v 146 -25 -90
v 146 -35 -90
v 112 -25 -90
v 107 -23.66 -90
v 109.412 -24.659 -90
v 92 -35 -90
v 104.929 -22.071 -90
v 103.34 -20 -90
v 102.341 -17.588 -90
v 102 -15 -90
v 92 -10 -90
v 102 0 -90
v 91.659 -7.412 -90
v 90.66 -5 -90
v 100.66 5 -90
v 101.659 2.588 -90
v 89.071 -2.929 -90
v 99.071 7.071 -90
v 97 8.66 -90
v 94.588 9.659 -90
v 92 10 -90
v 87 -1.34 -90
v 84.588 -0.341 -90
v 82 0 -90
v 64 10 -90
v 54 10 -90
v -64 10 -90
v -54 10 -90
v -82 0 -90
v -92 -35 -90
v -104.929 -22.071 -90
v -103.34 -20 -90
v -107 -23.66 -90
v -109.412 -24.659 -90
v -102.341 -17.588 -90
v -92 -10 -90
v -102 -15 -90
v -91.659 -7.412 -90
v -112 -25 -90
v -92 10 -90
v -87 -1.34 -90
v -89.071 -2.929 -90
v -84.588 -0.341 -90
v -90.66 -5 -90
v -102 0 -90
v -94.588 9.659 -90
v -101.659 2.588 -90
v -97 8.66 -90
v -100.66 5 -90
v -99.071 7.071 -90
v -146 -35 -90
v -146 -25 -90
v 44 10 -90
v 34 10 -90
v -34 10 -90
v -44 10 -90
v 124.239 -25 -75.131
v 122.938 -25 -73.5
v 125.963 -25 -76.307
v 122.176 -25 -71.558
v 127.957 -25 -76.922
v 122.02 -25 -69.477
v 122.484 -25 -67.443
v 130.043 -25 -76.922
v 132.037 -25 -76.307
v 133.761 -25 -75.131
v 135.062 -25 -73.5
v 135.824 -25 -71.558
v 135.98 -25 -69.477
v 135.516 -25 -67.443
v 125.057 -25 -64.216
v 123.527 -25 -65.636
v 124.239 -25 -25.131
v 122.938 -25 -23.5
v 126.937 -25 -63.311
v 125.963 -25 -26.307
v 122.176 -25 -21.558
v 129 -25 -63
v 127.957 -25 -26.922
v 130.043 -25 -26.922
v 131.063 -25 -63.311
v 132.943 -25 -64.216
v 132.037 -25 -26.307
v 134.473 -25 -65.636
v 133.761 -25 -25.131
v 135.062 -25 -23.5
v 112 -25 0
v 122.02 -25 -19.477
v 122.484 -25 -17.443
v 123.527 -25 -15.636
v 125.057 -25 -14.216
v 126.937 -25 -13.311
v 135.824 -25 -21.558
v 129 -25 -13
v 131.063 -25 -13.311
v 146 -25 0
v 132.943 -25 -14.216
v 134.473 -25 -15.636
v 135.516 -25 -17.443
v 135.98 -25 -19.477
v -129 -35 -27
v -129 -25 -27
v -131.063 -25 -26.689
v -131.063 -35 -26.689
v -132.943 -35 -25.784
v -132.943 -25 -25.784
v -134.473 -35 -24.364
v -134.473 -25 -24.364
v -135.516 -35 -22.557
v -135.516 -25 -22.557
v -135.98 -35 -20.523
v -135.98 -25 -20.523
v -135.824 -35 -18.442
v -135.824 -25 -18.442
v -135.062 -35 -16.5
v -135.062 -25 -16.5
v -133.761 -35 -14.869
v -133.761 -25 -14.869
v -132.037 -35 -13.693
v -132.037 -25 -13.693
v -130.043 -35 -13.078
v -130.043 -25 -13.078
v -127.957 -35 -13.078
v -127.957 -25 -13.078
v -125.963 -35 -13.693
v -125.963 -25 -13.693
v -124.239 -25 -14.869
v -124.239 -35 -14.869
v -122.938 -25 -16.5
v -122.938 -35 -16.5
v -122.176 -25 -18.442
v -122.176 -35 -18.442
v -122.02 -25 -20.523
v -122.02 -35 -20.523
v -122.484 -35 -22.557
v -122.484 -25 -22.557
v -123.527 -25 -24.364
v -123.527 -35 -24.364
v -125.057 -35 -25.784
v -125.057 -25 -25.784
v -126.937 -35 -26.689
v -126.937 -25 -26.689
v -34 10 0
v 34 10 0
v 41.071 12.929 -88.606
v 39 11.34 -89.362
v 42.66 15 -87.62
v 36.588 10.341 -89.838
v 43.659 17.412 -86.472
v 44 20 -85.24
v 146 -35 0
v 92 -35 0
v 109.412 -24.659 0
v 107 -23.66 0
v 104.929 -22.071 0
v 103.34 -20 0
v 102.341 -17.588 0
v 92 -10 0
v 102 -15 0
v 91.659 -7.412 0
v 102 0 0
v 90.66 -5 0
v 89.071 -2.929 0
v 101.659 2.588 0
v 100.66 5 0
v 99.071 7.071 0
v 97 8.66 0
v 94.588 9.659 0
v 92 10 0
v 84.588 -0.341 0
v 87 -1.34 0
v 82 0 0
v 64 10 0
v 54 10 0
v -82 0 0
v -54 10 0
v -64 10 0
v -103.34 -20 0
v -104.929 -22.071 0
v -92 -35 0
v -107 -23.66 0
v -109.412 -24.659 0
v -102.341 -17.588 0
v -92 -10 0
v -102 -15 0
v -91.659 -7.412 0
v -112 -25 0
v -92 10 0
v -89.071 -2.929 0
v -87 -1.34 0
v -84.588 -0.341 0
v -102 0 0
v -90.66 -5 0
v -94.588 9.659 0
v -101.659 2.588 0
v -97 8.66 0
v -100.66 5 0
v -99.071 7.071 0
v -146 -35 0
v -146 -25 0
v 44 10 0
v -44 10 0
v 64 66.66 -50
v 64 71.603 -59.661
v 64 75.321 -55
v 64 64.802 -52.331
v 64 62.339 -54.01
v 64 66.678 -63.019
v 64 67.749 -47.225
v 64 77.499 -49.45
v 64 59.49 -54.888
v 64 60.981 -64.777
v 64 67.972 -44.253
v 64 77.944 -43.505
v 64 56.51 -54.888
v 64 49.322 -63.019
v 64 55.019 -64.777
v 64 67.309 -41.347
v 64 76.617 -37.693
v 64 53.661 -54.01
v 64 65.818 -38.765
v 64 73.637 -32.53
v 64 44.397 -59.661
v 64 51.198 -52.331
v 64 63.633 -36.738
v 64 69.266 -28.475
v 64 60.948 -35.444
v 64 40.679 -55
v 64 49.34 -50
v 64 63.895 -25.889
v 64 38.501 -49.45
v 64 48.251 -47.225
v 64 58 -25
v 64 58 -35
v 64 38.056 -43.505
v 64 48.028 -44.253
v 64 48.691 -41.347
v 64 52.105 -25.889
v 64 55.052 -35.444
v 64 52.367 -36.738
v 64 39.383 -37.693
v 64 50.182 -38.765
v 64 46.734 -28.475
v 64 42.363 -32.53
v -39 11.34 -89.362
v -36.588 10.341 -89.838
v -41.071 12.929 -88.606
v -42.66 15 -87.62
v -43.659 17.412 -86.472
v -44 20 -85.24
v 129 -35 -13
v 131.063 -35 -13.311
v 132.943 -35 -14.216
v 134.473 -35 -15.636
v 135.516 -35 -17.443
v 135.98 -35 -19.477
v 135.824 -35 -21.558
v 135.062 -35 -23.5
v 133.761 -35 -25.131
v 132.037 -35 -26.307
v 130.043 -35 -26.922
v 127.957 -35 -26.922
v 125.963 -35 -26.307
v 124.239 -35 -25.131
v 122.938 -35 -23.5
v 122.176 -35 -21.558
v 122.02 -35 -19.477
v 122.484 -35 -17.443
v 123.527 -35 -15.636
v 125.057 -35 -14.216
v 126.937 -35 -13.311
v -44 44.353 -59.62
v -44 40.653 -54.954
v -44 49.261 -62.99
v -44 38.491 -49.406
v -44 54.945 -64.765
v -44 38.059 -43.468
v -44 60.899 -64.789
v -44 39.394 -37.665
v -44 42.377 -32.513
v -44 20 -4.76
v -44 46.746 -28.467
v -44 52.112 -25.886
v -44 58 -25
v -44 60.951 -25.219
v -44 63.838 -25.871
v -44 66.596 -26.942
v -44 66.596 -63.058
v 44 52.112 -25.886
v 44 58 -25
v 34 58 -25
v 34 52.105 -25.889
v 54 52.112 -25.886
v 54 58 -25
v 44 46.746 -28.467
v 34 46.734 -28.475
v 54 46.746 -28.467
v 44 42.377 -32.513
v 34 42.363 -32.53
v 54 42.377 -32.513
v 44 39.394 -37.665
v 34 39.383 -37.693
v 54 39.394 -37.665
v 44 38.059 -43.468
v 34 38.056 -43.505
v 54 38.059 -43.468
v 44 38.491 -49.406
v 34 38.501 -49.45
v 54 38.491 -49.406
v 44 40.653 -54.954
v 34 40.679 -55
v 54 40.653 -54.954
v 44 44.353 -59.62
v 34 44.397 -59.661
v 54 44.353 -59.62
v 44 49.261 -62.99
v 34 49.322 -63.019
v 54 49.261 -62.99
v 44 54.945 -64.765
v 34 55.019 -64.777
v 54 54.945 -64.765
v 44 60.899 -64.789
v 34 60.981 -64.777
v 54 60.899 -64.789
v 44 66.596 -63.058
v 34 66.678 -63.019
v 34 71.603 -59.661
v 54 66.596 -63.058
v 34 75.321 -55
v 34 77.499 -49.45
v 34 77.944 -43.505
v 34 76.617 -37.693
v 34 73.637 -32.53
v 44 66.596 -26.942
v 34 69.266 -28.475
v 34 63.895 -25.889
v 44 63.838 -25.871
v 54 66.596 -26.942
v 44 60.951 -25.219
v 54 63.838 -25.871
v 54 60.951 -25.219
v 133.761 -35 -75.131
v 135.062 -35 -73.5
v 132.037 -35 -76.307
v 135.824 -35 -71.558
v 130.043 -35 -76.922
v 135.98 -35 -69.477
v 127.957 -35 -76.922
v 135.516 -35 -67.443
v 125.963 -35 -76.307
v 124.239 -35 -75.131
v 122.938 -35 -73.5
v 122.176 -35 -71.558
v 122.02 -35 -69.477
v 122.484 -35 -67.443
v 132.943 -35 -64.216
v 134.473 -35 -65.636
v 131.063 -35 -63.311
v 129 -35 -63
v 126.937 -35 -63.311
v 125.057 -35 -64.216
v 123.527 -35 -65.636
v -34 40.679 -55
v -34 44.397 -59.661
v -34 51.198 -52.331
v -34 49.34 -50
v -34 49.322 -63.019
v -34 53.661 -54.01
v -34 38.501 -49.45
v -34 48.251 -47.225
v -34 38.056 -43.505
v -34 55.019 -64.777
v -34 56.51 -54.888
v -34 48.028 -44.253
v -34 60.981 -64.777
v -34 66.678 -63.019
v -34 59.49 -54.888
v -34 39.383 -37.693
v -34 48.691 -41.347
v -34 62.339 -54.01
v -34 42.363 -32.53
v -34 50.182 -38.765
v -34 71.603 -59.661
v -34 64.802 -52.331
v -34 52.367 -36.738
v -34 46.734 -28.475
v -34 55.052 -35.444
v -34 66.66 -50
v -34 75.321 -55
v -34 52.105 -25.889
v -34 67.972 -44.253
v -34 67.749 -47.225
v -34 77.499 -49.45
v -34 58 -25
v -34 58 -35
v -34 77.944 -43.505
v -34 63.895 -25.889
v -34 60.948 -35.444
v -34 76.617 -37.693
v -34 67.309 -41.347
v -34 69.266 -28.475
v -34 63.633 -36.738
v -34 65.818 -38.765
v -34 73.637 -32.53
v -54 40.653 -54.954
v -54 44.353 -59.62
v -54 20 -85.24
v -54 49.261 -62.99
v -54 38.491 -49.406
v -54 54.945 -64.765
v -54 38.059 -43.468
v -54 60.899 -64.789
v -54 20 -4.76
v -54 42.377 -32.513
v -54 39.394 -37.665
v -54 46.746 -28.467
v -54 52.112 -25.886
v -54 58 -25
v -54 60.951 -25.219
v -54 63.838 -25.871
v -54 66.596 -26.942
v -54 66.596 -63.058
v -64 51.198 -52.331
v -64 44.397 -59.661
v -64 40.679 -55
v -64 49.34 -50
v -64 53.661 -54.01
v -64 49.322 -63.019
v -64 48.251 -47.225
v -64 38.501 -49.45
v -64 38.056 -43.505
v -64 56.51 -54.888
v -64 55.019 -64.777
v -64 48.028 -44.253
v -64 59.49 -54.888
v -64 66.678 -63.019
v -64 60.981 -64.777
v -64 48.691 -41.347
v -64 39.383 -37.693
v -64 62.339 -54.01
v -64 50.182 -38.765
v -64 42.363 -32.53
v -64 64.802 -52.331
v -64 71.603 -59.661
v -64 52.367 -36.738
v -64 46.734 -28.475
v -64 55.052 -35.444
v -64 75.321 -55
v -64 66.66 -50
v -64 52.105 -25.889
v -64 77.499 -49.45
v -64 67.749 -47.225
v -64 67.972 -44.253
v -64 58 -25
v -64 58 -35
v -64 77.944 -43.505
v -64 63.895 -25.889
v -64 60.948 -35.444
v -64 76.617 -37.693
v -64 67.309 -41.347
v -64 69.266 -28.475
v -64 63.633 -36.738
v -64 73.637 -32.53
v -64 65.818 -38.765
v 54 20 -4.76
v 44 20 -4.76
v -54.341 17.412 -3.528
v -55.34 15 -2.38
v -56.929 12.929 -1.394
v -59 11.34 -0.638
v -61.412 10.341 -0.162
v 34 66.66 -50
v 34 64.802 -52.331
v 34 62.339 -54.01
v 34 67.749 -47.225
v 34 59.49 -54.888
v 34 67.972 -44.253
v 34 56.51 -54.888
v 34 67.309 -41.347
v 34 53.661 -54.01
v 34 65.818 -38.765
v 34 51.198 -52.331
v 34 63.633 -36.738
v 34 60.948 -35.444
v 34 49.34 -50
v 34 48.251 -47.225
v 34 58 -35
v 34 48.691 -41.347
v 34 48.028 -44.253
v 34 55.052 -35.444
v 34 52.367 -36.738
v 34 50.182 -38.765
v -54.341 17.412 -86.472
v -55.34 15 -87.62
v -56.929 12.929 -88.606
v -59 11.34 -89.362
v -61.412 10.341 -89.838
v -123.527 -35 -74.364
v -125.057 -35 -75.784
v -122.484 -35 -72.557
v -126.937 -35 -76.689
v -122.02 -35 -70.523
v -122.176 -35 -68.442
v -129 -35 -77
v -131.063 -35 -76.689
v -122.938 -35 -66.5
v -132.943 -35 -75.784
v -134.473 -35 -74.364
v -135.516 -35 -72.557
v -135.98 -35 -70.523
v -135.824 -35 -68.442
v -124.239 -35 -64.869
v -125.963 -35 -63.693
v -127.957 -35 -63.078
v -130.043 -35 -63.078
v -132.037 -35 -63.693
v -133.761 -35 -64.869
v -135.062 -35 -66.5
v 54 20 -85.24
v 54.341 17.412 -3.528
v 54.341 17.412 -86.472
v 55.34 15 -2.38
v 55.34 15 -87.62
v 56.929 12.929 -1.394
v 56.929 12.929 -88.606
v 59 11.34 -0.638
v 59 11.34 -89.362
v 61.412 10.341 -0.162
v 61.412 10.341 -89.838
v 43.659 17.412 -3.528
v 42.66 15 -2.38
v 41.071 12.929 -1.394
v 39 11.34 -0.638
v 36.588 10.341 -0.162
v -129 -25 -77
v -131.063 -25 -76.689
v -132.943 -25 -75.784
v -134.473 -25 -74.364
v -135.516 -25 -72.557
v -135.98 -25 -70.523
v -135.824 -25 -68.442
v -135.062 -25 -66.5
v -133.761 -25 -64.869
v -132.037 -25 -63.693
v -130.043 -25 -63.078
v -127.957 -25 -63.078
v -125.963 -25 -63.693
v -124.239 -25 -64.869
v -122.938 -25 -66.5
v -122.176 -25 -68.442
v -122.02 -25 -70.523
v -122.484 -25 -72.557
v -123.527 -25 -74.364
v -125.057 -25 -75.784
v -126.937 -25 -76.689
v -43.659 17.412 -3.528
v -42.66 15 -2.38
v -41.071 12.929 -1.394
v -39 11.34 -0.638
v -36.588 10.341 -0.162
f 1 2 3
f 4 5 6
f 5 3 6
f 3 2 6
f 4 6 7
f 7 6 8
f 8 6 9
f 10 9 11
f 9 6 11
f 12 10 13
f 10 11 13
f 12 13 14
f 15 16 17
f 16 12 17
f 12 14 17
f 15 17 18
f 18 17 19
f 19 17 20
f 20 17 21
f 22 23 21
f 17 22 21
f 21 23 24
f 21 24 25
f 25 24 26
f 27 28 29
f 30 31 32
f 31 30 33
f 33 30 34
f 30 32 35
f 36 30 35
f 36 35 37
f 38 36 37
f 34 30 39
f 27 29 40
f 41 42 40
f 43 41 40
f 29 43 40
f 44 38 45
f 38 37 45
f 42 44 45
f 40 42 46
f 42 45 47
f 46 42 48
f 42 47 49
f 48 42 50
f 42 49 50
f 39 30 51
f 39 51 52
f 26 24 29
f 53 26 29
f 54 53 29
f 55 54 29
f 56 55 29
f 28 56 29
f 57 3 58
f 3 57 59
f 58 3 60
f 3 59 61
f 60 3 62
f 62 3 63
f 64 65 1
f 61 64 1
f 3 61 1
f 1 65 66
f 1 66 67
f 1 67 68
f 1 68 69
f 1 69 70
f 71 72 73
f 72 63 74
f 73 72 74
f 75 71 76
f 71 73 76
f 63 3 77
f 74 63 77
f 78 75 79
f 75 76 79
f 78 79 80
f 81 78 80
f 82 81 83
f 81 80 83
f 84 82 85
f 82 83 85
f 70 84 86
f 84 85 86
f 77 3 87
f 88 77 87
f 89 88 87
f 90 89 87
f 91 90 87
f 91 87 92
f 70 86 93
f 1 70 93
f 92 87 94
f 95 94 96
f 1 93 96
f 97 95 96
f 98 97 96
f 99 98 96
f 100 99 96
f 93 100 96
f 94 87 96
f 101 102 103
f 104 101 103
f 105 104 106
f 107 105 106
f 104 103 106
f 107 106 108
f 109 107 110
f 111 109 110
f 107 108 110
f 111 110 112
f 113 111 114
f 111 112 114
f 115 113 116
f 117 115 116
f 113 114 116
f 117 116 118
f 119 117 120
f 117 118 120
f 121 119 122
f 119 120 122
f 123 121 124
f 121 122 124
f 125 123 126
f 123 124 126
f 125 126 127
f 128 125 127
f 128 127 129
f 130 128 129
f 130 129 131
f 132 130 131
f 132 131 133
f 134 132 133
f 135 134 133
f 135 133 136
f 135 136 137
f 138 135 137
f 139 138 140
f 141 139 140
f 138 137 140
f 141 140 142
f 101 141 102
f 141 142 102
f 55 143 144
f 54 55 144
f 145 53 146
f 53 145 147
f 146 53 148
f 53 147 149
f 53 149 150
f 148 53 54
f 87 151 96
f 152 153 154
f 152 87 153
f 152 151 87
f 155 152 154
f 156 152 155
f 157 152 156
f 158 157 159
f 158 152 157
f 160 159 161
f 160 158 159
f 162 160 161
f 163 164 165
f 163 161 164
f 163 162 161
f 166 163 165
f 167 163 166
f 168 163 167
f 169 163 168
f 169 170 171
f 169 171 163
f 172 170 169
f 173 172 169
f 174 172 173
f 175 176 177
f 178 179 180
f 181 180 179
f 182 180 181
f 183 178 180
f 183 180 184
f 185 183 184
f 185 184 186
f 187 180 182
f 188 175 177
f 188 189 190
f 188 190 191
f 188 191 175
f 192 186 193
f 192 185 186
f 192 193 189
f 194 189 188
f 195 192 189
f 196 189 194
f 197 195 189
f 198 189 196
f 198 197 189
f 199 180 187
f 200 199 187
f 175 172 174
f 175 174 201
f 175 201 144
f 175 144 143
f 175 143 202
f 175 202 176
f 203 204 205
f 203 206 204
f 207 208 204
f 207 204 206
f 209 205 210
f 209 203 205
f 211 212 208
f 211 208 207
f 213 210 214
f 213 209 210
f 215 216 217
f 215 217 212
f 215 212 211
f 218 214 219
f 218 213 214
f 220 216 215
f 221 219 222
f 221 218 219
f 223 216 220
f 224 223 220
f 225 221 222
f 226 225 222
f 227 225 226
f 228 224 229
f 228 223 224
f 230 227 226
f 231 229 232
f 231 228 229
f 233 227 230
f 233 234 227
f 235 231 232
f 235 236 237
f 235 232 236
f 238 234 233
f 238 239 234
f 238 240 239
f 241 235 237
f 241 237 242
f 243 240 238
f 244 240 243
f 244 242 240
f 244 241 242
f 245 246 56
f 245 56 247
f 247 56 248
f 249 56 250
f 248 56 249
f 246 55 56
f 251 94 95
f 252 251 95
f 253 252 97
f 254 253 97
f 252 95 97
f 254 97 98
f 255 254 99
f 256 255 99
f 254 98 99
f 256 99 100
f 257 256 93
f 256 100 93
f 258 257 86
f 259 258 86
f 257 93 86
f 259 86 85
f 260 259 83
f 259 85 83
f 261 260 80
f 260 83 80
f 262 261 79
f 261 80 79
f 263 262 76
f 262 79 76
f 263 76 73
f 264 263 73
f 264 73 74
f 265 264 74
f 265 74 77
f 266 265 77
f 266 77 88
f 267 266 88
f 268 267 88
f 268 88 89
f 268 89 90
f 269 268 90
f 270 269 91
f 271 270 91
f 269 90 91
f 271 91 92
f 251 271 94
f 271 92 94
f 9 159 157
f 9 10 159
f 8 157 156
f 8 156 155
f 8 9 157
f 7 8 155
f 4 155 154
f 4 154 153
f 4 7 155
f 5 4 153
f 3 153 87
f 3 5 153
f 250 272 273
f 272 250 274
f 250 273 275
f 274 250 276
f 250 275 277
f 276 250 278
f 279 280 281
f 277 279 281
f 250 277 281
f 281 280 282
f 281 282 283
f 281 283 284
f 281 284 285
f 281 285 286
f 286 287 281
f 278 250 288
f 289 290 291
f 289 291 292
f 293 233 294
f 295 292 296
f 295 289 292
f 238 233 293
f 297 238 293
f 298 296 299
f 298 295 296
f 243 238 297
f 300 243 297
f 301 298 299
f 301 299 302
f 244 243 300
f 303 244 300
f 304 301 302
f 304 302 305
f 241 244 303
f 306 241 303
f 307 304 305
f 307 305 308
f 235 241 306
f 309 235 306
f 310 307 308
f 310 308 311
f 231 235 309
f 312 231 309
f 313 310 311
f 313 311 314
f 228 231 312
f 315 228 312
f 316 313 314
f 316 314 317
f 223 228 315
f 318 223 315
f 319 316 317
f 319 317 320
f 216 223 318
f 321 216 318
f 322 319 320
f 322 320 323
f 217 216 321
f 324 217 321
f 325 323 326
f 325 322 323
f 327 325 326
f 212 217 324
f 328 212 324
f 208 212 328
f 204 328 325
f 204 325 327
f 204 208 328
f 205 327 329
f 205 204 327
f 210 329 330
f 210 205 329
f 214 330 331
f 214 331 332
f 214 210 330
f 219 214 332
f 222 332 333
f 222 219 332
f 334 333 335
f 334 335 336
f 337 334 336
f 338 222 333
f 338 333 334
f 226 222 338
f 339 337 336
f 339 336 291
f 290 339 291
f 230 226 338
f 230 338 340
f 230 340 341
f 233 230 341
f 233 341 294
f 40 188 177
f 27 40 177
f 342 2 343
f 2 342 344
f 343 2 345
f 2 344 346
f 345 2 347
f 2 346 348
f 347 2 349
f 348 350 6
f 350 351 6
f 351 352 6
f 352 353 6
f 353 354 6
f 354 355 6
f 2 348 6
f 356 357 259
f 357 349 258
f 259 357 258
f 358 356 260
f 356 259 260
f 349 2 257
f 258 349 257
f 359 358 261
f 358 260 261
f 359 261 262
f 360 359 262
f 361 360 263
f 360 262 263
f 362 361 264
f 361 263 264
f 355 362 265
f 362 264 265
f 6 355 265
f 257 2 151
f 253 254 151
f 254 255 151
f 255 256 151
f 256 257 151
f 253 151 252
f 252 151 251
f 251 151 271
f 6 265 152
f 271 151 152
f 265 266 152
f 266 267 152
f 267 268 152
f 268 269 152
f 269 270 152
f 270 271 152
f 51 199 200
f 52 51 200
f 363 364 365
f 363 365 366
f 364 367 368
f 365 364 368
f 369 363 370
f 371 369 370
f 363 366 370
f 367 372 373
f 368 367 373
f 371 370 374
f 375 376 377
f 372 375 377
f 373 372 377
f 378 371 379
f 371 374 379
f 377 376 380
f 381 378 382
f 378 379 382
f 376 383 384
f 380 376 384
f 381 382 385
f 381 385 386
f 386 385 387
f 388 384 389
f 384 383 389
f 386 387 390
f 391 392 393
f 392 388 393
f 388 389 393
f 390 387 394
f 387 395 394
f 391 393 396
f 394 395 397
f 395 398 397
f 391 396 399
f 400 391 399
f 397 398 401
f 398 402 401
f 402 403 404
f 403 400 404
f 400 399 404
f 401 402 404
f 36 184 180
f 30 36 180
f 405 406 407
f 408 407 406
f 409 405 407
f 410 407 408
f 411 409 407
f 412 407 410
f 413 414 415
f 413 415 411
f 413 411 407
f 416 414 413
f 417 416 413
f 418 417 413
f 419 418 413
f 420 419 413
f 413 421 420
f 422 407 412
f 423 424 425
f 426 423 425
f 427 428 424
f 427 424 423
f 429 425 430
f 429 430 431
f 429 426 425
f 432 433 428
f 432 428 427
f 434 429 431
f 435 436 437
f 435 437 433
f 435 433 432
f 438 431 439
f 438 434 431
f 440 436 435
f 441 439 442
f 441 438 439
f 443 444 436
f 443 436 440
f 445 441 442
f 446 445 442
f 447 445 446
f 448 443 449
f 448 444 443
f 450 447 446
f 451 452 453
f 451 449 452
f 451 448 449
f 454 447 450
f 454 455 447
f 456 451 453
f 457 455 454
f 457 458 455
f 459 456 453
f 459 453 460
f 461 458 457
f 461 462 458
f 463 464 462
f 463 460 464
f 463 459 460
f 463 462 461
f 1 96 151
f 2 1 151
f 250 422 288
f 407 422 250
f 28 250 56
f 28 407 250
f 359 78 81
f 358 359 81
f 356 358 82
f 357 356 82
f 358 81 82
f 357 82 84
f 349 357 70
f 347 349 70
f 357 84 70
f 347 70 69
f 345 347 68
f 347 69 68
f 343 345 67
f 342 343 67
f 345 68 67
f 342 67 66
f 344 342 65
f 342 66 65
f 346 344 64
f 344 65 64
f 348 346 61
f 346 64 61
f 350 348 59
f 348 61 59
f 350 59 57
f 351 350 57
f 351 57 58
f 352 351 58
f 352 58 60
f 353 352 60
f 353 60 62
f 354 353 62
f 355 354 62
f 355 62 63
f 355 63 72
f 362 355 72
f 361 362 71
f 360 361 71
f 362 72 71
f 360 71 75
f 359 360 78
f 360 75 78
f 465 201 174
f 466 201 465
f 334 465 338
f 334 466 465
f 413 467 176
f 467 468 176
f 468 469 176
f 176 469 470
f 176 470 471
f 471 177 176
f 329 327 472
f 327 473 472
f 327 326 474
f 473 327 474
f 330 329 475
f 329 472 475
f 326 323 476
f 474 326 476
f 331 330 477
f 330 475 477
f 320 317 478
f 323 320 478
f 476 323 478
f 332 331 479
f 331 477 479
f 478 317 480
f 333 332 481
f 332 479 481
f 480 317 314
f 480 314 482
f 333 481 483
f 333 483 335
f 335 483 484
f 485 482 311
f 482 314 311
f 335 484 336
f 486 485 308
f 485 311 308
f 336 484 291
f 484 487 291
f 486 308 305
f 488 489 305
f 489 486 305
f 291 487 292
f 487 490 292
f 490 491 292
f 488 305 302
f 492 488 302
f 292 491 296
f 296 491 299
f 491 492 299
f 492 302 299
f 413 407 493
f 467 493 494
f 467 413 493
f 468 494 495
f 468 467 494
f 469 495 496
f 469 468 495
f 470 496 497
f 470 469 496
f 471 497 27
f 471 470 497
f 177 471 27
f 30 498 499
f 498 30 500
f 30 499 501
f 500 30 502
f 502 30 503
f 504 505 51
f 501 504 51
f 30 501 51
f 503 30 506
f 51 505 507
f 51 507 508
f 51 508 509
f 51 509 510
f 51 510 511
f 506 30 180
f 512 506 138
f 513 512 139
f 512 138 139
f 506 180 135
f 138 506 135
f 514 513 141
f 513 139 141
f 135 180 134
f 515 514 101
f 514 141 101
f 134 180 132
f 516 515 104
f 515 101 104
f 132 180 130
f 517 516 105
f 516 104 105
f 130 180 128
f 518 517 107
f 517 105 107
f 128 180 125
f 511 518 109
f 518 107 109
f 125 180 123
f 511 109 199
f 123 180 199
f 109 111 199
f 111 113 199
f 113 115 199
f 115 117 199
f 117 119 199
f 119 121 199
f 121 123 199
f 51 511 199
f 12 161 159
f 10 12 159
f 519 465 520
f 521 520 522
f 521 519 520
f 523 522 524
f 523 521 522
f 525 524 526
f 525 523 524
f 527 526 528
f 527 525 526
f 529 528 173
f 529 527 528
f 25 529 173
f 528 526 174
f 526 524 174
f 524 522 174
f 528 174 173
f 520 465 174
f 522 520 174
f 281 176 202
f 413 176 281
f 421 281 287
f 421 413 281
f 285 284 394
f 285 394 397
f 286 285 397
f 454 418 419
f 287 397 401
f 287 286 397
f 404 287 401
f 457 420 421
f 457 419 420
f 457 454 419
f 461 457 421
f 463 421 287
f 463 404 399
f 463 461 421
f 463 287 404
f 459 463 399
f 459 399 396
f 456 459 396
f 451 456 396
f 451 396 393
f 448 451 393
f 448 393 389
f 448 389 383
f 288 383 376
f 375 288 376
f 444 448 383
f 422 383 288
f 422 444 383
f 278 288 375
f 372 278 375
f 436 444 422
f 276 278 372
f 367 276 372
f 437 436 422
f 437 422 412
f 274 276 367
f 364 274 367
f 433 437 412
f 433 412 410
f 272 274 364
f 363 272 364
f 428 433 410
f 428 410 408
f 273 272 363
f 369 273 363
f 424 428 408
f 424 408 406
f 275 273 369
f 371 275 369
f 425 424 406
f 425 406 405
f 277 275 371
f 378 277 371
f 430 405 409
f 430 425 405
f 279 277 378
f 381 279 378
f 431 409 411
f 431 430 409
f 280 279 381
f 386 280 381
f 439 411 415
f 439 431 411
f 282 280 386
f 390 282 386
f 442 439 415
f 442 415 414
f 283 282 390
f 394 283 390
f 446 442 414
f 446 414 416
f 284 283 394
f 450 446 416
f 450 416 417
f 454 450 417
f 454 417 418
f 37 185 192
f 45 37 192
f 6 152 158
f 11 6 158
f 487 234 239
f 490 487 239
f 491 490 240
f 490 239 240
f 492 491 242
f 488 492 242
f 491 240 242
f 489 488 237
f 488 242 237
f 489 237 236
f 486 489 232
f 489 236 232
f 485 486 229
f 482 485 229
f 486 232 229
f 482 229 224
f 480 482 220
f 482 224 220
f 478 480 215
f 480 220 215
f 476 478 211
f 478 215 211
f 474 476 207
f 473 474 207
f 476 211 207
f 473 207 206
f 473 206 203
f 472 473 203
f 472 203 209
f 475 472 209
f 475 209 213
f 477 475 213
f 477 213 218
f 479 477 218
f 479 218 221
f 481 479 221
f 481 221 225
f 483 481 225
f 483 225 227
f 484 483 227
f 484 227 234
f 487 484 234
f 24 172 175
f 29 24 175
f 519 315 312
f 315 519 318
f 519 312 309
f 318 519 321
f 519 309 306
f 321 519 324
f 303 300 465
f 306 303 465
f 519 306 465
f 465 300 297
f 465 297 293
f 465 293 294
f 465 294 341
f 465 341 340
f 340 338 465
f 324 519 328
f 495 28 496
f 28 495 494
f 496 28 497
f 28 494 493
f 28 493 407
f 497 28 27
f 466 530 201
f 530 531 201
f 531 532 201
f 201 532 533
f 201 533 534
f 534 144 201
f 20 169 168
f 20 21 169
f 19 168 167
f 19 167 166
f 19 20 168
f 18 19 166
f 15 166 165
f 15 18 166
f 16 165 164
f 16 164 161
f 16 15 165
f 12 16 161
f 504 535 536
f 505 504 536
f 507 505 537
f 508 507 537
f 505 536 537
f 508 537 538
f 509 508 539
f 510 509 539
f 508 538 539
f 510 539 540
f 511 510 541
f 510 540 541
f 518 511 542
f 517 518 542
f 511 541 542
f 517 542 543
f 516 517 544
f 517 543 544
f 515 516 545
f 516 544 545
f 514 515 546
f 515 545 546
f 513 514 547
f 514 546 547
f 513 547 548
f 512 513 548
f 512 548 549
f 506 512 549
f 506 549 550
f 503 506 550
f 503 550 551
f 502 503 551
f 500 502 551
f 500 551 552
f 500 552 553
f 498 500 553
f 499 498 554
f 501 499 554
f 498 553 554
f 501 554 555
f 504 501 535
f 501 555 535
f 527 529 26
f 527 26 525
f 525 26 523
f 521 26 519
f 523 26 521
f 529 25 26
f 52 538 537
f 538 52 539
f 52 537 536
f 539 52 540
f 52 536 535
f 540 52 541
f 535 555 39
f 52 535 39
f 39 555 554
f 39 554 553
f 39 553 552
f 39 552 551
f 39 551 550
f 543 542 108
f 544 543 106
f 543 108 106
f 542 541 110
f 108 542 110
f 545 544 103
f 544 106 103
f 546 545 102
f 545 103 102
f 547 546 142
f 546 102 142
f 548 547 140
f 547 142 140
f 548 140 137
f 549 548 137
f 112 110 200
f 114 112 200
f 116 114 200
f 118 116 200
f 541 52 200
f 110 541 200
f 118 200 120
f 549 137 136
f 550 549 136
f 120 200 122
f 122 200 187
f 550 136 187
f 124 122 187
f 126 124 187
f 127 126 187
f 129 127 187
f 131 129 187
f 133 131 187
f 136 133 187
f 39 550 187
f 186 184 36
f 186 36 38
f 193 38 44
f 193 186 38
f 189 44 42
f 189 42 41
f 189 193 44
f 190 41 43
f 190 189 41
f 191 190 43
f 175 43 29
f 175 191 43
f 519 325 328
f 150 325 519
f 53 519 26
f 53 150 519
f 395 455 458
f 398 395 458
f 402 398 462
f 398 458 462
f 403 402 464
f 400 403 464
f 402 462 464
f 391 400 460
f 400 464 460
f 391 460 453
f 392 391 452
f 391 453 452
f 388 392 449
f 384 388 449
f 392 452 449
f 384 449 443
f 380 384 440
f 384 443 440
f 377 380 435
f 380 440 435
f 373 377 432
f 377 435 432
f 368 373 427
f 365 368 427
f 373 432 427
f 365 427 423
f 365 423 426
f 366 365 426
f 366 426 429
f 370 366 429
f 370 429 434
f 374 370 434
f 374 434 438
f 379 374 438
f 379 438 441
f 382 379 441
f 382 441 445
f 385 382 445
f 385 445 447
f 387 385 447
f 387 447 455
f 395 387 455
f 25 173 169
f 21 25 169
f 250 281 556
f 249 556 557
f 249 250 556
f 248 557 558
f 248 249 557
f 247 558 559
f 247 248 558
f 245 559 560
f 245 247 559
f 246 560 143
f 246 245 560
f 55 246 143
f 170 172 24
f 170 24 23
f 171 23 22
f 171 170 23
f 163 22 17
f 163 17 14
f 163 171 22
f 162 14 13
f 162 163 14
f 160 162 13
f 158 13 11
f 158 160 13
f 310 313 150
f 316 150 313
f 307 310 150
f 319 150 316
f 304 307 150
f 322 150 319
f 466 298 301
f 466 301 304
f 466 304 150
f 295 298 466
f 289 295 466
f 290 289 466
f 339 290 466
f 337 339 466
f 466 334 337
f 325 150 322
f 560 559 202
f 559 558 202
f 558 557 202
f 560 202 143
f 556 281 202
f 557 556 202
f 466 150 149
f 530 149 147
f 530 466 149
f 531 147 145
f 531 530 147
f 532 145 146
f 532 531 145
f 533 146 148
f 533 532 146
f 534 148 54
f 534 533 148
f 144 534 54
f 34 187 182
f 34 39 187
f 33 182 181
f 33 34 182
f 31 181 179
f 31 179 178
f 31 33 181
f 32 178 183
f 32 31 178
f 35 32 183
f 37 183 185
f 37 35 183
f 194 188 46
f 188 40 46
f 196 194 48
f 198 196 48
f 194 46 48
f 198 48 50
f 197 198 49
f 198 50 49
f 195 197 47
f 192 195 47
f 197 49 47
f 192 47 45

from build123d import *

# Parameters (mm, degrees)
BOSS_EXTRUDE1_DEPTH      = 90
FILLET1_R                = 10
SKETCH2_R                = 7
CUT_EXTRUDE1_DEPTH       = 10
SKETCH10_R               = 20
SKETCH10_R_2             = 10
BOSS_EXTRUDE5_DEPTH      = 68
SKETCH11_R               = 20
SKETCH11_R_2             = 10
CUT_EXTRUDE5_DEPTH       = 38
BOSS_EXTRUDE6_DEPTH      = 5
BOSS_EXTRUDE6_DEPTH_BACK = 5
FILLET3_R                = 10
SKETCH15_R               = 20
SKETCH15_R_2             = 10
BOSS_EXTRUDE7_DEPTH      = 68
CUT_EXTRUDE6_START       = -38
SKETCH16_R               = 20
SKETCH16_R_2             = 10
CUT_EXTRUDE6_DEPTH       = 38
BOSS_EXTRUDE8_DEPTH      = 5
BOSS_EXTRUDE8_DEPTH_BACK = 5
FILLET4_R                = 10


with BuildPart() as part:
    # Sketch1 → Boss-Extrude1 (new body)
    with BuildSketch(Plane.XY):
        Polygon((-102, 10), (102, 10), (102, -25), (146, -25), (146, -35), (92, -35), (92, 0), (-92, 0), (-92, -35), (-146, -35), (-146, -25), (-102, -25), align=None)
    extrude(amount=-BOSS_EXTRUDE1_DEPTH)

    # Fillet1
    fillet1_edges = [part.edges().sort_by_distance(p)[0] for p in [
        (-102, -25, -45),
        (-102, 10, -45),
        (102, 10, -45),
        (102, -25, -45),
    ]]
    fillet(fillet1_edges, radius=FILLET1_R)

    # Sketch2 → Cut-Extrude1 (cut)
    with BuildSketch(Plane(origin=(0, -25, 0), x_dir=(1, 0, 0), z_dir=(0, 1, 0))):
        with Locations(Location((129, 20, 0), (0, 0, 270))):
            Circle(SKETCH2_R)
        with Locations(Location((129, 70, 0), (0, 0, 270))):
            Circle(SKETCH2_R)
        with Locations(Location((-129, 70, 0), (0, 0, 90))):
            Circle(SKETCH2_R)
        with Locations(Location((-129, 20, 0), (0, 0, 90))):
            Circle(SKETCH2_R)
    extrude(amount=-CUT_EXTRUDE1_DEPTH, mode=Mode.SUBTRACT)



with BuildPart() as body_2:
    # Sketch10 → Boss-Extrude5 (new body)
    with BuildSketch(Plane.ZY.offset(102)):
        with Locations((-45, 48)):
            Circle(SKETCH10_R)
        with Locations((-45, 48)):
            Circle(SKETCH10_R_2, mode=Mode.SUBTRACT)
    extrude(amount=-BOSS_EXTRUDE5_DEPTH)

    # Sketch11 → Cut-Extrude5 (cut)
    with BuildSketch(Plane.ZY.offset(102)):
        with Locations((-45, 48)):
            Circle(SKETCH11_R)
        with Locations((-45, 48)):
            Circle(SKETCH11_R_2, mode=Mode.SUBTRACT)
    extrude(amount=-CUT_EXTRUDE5_DEPTH, mode=Mode.SUBTRACT)


with BuildPart() as body_2_1:
    # Body-Move/Copy1: moved
    add(body_2.part.moved(Location((0, 10, 0))))


with BuildPart() as part_1:
    add(part.part)

    add(body_2_1.part)  # Boss-Extrude6 merges body 2
    # Sketch14 → Boss-Extrude6 (add, two sides: drawn at the far end of the back side and taken through both)
    with BuildSketch(Plane(origin=(-49, 0, 0), x_dir=(0, 0, -1), z_dir=(1, 0, 0)).offset(-BOSS_EXTRUDE6_DEPTH_BACK)):
        with BuildLine():
            Line((45, 10), (0, 10))
            Line((0, 10), (26.941680216, 66.596341464))
            ThreePointArc((26.941680216, 66.596341464), (45, 38), (63.058319784, 66.596341464))
            Line((63.058319784, 66.596341464), (90, 10))
            Line((90, 10), (45, 10))
        make_face()
    extrude(amount=BOSS_EXTRUDE6_DEPTH + BOSS_EXTRUDE6_DEPTH_BACK)

    # Fillet3
    # the kernel refuses this fillet: 10 mm, written as the material it adds along each edge
    with BuildSketch(Plane(origin=(-54, 10, 0), x_dir=(-1, 0, 0), z_dir=(0, 0, -1))) as fillet3_piece_1_section:
        with BuildLine():
            CenterArc((FILLET3_R, FILLET3_R), FILLET3_R, 180, 90)
            Line((0, FILLET3_R), (0, 0))
            Line((0, 0), (FILLET3_R, 0))
        make_face()
    fillet3_piece_1 = extrude(amount=90, mode=Mode.PRIVATE)
    fillet3_piece_1 = split(fillet3_piece_1, bisect_by=Plane(origin=(-56.293482883, 29.268794576, -9.172566427), z_dir=(0, -0.4298170732175253, -0.9029159892098049)), keep=Keep.TOP, mode=Mode.PRIVATE)
    fillet3_piece_1 = split(fillet3_piece_1, bisect_by=Plane(origin=(-56.293482883, 29.268794576, -80.827433573), z_dir=(0, -0.4298170732175253, 0.9029159892098049)), keep=Keep.TOP, mode=Mode.PRIVATE)
    add(fillet3_piece_1)
    with BuildSketch(Plane(origin=(-44, 10, -90), x_dir=(1, 0, 0), z_dir=(0, 0, 1))) as fillet3_piece_2_section:
        with BuildLine():
            CenterArc((FILLET3_R, FILLET3_R), FILLET3_R, 180, 90)
            Line((0, FILLET3_R), (0, 0))
            Line((0, 0), (FILLET3_R, 0))
        make_face()
    fillet3_piece_2 = extrude(amount=90, mode=Mode.PRIVATE)
    fillet3_piece_2 = split(fillet3_piece_2, bisect_by=Plane(origin=(-41.706517117, 29.268794576, -9.172566427), z_dir=(0, -0.4298170732175253, -0.9029159892098049)), keep=Keep.TOP, mode=Mode.PRIVATE)
    fillet3_piece_2 = split(fillet3_piece_2, bisect_by=Plane(origin=(-41.706517117, 29.268794576, -80.827433573), z_dir=(0, -0.4298170732175253, 0.9029159892098049)), keep=Keep.TOP, mode=Mode.PRIVATE)
    add(fillet3_piece_2)



with BuildPart() as body_2_2:
    # Sketch15 → Boss-Extrude7 (new body)
    with BuildSketch(Plane(origin=(102, 0, 0), x_dir=(0, 0, -1), z_dir=(1, 0, 0))):
        with Locations(Location((45, 58, 0), (0, 0, 180))):
            Circle(SKETCH15_R)
        with Locations(Location((45, 58, 0), (0, 0, 180))):
            Circle(SKETCH15_R_2, mode=Mode.SUBTRACT)
    extrude(amount=-BOSS_EXTRUDE7_DEPTH)

    # Sketch16 → Cut-Extrude6 (cut)
    with BuildSketch(Plane(origin=(102, 0, 0), x_dir=(0, 0, -1), z_dir=(1, 0, 0)).offset(CUT_EXTRUDE6_START)):
        with Locations(Location((45, 58, 0), (0, 0, 180))):
            Circle(SKETCH16_R)
        with Locations(Location((45, 58, 0), (0, 0, 180))):
            Circle(SKETCH16_R_2, mode=Mode.SUBTRACT)
    extrude(amount=CUT_EXTRUDE6_DEPTH, mode=Mode.SUBTRACT)


with BuildPart() as part_2:
    add(part_1.part)

    add(body_2_2.part)  # Boss-Extrude8 merges body 2 2
    # Sketch17 → Boss-Extrude8 (add, two sides: drawn at the far end of the back side and taken through both)
    with BuildSketch(Plane(origin=(49, 0, 0), x_dir=(0, 0, -1), z_dir=(1, 0, 0)).offset(-BOSS_EXTRUDE8_DEPTH_BACK)):
        with BuildLine():
            Line((45, 10), (0, 10))
            Line((0, 10), (26.941680216, 66.596341464))
            ThreePointArc((26.941680216, 66.596341464), (45, 38), (63.058319784, 66.596341464))
            Line((63.058319784, 66.596341464), (90, 10))
            Line((90, 10), (45, 10))
        make_face()
    extrude(amount=BOSS_EXTRUDE8_DEPTH + BOSS_EXTRUDE8_DEPTH_BACK)

    # Fillet4
    # the kernel refuses this fillet: 10 mm, written as the material it adds along each edge
    with BuildSketch(Plane(origin=(44, 10, 0), x_dir=(-1, 0, 0), z_dir=(0, 0, -1))) as fillet4_piece_1_section:
        with BuildLine():
            CenterArc((FILLET4_R, FILLET4_R), FILLET4_R, 180, 90)
            Line((0, FILLET4_R), (0, 0))
            Line((0, 0), (FILLET4_R, 0))
        make_face()
    fillet4_piece_1 = extrude(amount=90, mode=Mode.PRIVATE)
    fillet4_piece_1 = split(fillet4_piece_1, bisect_by=Plane(origin=(41.706517117, 29.268794576, -80.827433573), z_dir=(0, -0.4298170732175253, 0.9029159892098049)), keep=Keep.TOP, mode=Mode.PRIVATE)
    fillet4_piece_1 = split(fillet4_piece_1, bisect_by=Plane(origin=(41.706517117, 29.268794576, -9.172566427), z_dir=(0, -0.4298170732175254, -0.9029159892098049)), keep=Keep.TOP, mode=Mode.PRIVATE)
    add(fillet4_piece_1)
    with BuildSketch(Plane(origin=(54, 10, -90), x_dir=(1, 0, 0), z_dir=(0, 0, 1))) as fillet4_piece_2_section:
        with BuildLine():
            CenterArc((FILLET4_R, FILLET4_R), FILLET4_R, 180, 90)
            Line((0, FILLET4_R), (0, 0))
            Line((0, 0), (FILLET4_R, 0))
        make_face()
    fillet4_piece_2 = extrude(amount=90, mode=Mode.PRIVATE)
    fillet4_piece_2 = split(fillet4_piece_2, bisect_by=Plane(origin=(56.293482883, 29.268794576, -9.172566427), z_dir=(0, -0.4298170732175254, -0.9029159892098049)), keep=Keep.TOP, mode=Mode.PRIVATE)
    fillet4_piece_2 = split(fillet4_piece_2, bisect_by=Plane(origin=(56.293482883, 29.268794576, -80.827433573), z_dir=(0, -0.4298170732175253, 0.9029159892098049)), keep=Keep.TOP, mode=Mode.PRIVATE)
    add(fillet4_piece_2)
    with BuildSketch(Plane(origin=(92, 0, 0), x_dir=(0, -1, 0), z_dir=(0, 0, -1)), Plane(origin=(-92, 0, 0), x_dir=(1, 0, 0), z_dir=(0, 0, -1))) as fillet4_piece_3:
        with BuildLine():
            CenterArc((FILLET4_R, FILLET4_R), FILLET4_R, 180, 90)
            Line((0, FILLET4_R), (0, 0))
            Line((0, 0), (FILLET4_R, 0))
        make_face()
    extrude(amount=90)


solid = part_2.part
